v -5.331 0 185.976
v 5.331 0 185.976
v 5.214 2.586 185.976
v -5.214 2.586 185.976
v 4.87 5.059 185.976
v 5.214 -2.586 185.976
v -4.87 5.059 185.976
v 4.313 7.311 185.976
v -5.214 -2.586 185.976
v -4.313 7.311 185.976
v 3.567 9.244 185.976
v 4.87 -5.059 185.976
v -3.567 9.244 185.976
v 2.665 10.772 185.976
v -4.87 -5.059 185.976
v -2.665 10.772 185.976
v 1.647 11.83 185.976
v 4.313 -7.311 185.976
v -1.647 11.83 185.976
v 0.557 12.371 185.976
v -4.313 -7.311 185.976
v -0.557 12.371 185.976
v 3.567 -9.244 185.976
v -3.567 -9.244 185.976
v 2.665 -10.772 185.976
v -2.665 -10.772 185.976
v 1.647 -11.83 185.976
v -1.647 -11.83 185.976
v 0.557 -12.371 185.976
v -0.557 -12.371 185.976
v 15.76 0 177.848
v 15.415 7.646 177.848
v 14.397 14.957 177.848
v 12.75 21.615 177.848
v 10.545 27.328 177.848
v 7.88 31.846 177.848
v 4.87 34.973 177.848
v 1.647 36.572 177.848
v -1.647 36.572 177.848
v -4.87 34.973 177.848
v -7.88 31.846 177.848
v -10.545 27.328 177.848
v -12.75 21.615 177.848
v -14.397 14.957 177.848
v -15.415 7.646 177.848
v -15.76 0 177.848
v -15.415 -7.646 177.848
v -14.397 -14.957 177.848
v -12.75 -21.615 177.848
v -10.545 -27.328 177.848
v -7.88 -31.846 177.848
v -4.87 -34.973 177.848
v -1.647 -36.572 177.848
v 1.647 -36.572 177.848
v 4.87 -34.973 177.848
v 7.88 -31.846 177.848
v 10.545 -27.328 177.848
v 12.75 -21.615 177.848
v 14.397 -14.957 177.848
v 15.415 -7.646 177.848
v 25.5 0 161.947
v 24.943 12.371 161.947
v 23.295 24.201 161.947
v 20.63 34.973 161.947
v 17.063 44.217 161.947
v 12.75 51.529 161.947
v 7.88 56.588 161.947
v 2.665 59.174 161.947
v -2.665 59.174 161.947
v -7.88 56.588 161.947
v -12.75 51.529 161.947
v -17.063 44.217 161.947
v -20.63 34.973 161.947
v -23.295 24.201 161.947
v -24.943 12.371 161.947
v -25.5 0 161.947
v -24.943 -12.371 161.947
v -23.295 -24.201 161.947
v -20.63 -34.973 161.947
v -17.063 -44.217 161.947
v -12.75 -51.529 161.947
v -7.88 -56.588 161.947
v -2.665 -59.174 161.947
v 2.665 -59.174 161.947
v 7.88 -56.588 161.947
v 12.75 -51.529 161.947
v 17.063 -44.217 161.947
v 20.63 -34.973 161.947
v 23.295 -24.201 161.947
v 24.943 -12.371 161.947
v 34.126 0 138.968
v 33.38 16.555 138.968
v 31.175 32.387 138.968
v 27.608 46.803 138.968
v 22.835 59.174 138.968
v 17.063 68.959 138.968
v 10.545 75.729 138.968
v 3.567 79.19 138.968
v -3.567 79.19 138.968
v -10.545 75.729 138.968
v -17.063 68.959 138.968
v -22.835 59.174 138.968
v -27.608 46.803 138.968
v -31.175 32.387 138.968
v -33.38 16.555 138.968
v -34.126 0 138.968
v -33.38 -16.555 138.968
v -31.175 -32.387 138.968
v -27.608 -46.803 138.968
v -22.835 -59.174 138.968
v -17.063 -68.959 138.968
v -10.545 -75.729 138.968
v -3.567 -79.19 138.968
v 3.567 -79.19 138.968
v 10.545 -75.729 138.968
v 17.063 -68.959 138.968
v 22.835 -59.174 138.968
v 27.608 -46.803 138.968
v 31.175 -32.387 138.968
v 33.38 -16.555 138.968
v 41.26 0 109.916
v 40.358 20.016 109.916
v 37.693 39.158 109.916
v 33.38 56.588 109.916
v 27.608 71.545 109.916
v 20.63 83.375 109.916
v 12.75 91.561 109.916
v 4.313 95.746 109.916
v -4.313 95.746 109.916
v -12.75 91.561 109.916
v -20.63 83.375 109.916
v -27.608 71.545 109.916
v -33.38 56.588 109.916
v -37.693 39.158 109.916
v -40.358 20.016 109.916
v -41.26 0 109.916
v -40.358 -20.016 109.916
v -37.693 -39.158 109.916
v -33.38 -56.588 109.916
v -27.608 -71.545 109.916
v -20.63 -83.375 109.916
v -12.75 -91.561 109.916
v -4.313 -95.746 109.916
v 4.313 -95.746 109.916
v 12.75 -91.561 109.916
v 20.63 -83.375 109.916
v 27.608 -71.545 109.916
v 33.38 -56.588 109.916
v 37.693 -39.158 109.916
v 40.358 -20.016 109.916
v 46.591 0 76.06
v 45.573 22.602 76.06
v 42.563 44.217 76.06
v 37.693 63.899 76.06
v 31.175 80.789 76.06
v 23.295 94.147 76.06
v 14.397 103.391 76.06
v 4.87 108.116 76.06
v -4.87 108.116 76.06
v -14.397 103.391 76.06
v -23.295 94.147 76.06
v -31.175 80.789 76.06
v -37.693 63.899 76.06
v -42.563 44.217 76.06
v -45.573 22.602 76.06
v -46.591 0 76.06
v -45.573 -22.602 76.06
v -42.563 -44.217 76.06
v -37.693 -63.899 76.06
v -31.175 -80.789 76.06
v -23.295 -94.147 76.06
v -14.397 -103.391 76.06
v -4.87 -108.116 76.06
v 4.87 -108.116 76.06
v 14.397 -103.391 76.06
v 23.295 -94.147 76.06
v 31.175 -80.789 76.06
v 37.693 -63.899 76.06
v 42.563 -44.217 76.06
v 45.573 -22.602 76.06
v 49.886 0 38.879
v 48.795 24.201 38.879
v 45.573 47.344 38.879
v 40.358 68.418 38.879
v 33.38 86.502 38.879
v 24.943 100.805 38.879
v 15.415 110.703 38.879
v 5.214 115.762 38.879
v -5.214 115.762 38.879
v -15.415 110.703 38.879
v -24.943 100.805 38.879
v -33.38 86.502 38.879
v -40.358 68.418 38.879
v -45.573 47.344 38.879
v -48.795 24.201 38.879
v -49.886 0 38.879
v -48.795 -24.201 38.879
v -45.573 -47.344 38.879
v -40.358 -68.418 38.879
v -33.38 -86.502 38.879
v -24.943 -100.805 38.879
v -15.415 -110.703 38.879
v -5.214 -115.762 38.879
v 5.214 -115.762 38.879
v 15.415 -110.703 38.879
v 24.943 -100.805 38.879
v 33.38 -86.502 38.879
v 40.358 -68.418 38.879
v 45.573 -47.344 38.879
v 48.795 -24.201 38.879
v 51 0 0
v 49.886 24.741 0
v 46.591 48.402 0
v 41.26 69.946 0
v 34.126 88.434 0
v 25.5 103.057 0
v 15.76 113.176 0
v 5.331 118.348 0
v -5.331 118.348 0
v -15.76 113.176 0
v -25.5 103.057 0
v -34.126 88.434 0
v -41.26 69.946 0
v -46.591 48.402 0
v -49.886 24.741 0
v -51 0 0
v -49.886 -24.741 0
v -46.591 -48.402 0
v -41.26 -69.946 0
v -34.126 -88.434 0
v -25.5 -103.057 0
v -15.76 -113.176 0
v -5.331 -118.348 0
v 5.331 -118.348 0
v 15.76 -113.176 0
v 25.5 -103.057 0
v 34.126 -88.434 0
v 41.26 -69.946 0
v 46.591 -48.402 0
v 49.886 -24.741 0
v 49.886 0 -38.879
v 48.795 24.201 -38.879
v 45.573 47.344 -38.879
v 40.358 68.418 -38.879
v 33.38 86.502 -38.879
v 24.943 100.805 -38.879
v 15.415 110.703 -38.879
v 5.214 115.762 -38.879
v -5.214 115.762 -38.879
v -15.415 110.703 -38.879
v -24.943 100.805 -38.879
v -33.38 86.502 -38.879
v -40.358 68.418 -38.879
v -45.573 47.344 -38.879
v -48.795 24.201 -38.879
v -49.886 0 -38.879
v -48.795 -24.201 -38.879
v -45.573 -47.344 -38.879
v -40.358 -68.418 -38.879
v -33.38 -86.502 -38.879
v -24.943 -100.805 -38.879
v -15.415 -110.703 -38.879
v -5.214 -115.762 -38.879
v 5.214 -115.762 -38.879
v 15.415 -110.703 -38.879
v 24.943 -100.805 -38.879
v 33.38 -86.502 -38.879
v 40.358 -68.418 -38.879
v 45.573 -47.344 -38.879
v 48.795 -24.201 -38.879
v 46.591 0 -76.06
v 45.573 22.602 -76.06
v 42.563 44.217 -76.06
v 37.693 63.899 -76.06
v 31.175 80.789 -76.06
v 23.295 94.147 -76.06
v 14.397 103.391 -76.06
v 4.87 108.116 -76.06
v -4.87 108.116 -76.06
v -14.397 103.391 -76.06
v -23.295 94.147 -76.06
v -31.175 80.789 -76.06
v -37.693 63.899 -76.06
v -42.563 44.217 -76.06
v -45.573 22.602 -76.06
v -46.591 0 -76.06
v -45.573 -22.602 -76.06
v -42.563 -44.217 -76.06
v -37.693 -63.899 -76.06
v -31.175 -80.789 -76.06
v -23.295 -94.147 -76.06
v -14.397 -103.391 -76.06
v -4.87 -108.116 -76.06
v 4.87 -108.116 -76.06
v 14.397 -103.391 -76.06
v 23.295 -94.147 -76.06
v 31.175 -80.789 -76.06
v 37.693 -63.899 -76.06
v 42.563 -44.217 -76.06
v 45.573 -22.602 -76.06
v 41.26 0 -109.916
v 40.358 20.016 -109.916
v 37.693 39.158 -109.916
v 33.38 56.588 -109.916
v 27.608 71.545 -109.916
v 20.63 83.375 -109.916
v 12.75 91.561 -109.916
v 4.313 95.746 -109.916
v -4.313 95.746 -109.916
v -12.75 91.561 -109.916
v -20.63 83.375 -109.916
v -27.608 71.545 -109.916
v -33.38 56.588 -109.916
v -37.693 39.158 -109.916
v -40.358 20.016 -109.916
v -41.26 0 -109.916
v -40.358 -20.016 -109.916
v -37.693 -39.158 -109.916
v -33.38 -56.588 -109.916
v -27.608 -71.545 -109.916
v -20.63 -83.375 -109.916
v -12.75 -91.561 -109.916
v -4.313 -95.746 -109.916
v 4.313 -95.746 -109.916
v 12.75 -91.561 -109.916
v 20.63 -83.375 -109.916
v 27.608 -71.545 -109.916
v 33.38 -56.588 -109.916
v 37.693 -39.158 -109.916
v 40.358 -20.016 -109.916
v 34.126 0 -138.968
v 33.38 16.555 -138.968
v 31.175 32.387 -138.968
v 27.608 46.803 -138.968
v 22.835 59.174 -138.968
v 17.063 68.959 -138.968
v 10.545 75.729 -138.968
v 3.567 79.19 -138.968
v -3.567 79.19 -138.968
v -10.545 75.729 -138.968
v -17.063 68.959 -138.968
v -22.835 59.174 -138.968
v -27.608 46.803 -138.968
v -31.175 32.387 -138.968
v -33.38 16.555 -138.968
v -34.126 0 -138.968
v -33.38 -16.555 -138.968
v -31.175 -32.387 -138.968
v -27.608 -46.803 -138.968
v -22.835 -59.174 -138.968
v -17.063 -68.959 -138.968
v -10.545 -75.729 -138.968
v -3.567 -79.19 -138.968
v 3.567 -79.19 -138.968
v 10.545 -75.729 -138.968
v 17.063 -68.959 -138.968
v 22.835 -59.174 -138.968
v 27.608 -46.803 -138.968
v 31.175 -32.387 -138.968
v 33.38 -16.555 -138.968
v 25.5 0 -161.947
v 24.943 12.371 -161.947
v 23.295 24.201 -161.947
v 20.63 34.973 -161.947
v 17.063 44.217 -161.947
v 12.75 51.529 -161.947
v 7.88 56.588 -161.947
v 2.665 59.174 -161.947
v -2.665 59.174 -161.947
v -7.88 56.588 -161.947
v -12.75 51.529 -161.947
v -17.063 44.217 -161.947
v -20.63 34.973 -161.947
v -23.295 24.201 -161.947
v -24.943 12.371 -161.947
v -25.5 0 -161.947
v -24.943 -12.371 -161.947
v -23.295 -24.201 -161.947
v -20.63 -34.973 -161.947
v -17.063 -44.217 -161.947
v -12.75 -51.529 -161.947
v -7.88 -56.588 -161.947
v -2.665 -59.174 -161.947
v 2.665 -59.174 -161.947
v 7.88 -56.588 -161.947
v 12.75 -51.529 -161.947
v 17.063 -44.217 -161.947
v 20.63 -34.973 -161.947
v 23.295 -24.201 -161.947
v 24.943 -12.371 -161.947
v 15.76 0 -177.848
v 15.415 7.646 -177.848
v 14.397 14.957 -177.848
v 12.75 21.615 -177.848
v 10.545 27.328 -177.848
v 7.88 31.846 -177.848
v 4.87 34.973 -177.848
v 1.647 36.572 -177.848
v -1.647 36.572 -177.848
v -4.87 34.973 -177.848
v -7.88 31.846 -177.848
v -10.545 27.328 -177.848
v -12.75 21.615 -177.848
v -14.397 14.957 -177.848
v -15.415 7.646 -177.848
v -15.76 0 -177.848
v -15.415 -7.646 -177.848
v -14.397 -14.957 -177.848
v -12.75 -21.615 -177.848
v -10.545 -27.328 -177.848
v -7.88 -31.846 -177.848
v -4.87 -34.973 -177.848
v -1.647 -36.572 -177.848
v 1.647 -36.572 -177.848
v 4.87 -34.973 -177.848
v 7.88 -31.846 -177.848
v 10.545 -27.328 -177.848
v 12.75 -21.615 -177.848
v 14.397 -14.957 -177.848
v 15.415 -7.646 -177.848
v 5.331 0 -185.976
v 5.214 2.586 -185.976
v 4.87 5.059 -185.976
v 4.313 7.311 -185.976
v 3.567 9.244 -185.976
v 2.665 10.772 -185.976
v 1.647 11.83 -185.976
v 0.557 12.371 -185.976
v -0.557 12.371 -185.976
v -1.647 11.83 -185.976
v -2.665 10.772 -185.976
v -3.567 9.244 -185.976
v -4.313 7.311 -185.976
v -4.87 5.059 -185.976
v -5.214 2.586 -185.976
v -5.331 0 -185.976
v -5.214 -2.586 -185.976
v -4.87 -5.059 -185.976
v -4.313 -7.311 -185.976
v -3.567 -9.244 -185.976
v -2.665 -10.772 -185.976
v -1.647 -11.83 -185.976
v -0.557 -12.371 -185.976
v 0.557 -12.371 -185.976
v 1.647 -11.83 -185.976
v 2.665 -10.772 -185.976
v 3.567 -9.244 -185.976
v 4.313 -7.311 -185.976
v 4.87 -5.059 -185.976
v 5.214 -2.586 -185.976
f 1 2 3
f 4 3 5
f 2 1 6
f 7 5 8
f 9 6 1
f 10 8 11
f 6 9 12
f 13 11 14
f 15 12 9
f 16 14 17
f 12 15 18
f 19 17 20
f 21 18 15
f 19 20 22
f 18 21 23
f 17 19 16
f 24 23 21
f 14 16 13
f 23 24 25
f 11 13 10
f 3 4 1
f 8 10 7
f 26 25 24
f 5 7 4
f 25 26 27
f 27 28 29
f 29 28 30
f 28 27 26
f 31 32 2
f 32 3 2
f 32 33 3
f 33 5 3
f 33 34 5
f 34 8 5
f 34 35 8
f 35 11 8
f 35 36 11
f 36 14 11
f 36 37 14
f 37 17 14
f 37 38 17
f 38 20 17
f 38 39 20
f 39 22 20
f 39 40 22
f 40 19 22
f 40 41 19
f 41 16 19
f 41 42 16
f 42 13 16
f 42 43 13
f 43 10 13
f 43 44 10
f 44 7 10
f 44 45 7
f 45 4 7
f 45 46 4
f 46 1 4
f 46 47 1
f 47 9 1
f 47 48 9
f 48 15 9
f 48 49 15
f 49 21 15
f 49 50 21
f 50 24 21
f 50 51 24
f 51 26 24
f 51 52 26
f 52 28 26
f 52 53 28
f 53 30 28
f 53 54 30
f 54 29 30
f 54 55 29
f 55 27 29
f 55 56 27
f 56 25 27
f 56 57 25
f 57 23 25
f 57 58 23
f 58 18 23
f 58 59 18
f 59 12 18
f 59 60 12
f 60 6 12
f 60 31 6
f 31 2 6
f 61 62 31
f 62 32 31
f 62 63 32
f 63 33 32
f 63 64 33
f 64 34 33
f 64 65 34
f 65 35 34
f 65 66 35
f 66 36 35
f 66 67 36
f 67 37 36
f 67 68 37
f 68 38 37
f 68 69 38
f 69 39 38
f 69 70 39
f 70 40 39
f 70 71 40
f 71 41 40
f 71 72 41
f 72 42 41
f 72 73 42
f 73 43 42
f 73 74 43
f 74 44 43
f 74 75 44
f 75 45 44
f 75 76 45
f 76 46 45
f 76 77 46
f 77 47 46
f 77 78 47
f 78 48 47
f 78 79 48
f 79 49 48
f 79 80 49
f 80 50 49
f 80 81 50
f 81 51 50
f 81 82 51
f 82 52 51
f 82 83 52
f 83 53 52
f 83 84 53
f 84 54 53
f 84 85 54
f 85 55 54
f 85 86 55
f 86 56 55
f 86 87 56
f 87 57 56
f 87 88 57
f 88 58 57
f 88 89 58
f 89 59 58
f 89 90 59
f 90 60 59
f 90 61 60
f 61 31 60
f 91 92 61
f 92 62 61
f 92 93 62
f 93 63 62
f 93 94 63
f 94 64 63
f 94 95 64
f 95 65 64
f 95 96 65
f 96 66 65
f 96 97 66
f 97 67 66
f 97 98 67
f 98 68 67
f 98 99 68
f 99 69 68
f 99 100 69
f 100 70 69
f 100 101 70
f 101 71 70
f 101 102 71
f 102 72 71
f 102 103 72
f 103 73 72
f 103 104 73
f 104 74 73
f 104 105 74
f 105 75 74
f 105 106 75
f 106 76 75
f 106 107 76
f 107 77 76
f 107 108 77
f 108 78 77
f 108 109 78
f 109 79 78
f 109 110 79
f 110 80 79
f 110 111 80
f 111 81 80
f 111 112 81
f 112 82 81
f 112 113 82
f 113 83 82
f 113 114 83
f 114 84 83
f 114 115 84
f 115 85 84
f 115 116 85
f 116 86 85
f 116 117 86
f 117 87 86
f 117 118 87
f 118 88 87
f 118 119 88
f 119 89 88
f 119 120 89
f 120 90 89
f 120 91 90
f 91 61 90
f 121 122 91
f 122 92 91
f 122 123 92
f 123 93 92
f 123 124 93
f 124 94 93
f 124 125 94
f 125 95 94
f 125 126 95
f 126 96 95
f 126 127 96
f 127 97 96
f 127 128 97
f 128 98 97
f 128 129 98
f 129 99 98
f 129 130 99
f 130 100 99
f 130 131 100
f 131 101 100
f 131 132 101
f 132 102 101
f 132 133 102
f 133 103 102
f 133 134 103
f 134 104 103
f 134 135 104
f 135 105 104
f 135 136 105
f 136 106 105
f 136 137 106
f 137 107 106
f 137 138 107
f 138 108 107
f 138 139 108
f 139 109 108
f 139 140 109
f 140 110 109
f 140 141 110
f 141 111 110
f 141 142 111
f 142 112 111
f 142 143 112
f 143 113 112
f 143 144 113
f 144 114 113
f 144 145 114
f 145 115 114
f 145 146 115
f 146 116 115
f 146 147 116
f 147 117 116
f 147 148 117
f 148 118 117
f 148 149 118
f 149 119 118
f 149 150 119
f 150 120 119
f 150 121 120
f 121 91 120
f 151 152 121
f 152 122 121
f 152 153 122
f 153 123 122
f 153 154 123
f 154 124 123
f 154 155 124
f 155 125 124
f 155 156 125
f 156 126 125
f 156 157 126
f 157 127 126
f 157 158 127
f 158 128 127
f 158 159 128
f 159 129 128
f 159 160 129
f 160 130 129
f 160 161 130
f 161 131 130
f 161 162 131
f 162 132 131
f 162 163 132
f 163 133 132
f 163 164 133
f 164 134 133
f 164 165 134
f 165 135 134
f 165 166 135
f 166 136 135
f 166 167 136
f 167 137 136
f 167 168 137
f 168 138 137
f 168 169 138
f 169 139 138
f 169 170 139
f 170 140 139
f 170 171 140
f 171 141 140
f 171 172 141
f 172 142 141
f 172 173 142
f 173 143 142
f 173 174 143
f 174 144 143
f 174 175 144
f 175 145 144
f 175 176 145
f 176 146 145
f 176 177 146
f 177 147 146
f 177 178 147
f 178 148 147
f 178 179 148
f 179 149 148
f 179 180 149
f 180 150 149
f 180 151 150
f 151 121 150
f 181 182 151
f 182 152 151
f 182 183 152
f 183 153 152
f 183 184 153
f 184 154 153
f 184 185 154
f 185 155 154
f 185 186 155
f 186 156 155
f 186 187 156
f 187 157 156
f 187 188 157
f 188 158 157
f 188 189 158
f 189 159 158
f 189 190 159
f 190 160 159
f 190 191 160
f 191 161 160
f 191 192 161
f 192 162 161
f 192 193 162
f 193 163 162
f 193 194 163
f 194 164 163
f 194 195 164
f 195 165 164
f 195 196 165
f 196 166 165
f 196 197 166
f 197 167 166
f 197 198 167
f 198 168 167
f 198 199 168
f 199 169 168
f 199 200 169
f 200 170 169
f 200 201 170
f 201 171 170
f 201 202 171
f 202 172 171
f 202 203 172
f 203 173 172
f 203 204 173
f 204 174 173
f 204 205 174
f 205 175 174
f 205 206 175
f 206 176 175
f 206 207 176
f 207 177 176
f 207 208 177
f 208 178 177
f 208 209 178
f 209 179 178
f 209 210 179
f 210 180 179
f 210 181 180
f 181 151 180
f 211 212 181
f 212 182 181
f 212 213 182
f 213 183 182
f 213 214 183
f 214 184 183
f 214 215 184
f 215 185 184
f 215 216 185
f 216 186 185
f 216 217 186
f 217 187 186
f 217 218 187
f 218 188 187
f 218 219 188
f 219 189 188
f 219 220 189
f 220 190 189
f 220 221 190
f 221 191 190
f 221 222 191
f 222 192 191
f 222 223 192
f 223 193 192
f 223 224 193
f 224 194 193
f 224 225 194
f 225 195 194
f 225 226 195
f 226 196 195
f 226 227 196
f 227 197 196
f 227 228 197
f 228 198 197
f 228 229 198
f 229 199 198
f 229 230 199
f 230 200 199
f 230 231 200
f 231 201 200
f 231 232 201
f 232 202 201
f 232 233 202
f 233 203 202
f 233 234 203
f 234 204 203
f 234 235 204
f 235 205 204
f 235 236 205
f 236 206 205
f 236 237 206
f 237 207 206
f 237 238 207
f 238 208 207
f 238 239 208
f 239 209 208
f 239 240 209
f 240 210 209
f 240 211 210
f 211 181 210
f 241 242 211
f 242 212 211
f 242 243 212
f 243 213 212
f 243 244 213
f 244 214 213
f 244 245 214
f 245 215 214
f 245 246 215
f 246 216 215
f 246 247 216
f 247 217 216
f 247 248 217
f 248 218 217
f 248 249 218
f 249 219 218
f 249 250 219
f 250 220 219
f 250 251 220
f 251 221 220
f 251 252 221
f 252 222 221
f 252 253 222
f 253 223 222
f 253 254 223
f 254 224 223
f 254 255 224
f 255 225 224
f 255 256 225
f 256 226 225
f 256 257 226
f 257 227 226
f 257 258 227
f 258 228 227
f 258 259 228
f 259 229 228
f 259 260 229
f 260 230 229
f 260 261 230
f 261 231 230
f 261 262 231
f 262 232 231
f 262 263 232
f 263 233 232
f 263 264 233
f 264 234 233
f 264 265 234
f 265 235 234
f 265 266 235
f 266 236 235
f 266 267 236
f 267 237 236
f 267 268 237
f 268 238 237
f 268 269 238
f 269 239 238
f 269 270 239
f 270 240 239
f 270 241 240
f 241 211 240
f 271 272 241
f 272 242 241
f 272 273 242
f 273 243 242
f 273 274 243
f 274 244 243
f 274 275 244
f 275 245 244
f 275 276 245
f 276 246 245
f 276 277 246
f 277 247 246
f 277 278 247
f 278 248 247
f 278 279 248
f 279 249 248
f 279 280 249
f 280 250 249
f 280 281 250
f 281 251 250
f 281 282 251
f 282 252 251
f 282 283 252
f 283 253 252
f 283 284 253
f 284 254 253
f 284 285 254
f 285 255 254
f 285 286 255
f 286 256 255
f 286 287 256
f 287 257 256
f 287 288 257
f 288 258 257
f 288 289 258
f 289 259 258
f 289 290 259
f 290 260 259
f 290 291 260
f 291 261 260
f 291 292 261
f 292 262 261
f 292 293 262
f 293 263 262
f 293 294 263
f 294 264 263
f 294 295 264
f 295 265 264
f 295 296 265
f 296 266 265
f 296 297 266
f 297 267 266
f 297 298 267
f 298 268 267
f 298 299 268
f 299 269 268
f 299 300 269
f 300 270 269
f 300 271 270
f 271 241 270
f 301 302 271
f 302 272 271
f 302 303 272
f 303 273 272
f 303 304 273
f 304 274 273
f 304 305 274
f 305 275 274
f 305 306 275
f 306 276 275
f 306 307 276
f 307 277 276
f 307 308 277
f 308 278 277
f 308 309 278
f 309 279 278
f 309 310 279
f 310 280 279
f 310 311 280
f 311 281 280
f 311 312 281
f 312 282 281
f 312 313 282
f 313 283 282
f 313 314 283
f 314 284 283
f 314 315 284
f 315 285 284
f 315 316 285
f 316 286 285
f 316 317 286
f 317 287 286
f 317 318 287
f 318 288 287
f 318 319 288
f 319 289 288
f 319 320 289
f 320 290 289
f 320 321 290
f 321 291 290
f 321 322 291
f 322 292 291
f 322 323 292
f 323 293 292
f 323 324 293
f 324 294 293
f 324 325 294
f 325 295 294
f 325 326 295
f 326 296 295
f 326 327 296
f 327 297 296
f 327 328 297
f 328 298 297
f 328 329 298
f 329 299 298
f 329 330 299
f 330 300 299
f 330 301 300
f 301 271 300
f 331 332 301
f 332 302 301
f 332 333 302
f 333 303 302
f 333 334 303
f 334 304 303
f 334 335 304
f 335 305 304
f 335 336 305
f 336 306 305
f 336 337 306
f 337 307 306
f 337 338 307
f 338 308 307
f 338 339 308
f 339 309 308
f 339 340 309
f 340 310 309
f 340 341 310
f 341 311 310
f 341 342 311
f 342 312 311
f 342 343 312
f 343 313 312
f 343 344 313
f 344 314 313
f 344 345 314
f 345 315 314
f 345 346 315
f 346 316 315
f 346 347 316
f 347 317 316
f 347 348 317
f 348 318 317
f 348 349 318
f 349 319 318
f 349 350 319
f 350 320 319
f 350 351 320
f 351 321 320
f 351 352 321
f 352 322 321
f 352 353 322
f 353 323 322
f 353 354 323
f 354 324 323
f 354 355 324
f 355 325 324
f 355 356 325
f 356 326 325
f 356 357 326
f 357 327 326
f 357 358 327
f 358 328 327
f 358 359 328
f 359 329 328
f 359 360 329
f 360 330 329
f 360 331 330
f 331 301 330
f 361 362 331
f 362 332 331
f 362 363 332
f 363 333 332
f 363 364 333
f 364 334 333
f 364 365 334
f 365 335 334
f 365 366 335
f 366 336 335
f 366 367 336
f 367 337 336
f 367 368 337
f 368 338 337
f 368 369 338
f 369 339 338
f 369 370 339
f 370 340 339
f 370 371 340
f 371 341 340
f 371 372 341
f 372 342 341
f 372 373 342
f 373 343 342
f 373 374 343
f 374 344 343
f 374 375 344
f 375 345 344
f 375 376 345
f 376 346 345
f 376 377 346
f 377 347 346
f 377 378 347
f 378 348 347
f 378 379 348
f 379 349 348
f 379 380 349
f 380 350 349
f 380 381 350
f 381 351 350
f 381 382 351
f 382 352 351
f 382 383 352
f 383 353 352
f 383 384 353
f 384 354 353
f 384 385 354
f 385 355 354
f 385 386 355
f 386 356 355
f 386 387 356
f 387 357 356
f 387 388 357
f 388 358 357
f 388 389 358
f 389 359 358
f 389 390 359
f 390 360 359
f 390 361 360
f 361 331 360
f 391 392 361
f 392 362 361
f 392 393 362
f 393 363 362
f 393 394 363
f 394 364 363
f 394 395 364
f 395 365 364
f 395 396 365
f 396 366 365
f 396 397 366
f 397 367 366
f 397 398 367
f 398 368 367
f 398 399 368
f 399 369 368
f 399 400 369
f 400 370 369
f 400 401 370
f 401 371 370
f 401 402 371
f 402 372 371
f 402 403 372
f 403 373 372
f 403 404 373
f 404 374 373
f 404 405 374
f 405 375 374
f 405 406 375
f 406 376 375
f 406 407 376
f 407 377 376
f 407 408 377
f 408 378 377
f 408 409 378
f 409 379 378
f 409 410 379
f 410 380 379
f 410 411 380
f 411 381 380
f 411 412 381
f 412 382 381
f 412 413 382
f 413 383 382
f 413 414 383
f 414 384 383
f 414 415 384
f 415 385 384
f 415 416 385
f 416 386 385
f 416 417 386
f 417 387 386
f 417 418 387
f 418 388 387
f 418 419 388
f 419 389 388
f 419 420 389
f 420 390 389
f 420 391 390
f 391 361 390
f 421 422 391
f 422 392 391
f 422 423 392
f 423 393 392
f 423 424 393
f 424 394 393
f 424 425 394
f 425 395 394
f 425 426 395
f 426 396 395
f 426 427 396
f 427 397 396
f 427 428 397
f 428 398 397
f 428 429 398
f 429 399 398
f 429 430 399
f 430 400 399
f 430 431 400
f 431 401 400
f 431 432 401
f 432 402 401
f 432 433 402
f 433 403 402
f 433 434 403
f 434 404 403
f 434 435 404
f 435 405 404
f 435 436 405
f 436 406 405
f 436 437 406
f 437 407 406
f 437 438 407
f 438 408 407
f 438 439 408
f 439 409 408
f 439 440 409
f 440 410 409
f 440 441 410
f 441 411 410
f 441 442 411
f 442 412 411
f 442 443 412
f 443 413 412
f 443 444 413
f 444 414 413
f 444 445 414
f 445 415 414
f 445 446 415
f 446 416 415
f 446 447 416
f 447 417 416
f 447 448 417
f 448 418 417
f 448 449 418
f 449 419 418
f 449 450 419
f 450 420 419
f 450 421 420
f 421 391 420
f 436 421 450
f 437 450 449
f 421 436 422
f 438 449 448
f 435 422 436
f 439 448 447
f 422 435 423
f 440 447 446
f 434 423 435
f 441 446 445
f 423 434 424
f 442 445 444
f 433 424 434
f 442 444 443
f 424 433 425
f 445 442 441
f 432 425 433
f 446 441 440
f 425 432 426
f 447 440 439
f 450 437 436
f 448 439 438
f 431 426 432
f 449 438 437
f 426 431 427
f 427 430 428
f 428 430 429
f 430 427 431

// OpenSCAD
// Generated by SolidPython 1.0.1 on 2020-07-29 00:46:45


scale(v = [3, 7, 11]) {
	sphere(r = 17);
}
/***********************************************
*********      SolidPython code:      **********
************************************************
 
# import packages: SolidPython
from solid import *
from solid.utils import *
from itertools import chain, combinations, permutations


class Resize:

    def __init__(self, scad_file):
        self.scad_file = scad_file
        #self.scad_file = import_scad(scad_file)
        # cone/cylinder param:
        self.r1 = 0
        self.r2 = 0
        self.h = 0
        # rectangular prism param:
        self.w = 0
        self.l = 0
        # ellipse param:
        self.r = 0

    # import OpenScad code (file name corresponds to shape)


    # classify shape + parameters
    def assign(self, param1, param2, param3):
        if self.scad_file == 'cone.scad':
            self.r1 = param1
            self.r2 = param2
            self.h = param3
        elif self.scad_file == 'cylinder.scad':
            self.r1 = param1
            self.r2 = param2
            self.h = param3
        elif self.scad_file == 'rectangularPrism.scad':
            self.h = param1
            self.l = param2
            self.w = param3
        else:
            self.r = param1
            self.h = param2

    # resize parameters
    def iterate(self):
        x = range(3, 20, 2)
        i = 1
        if self.scad_file == 'cone.scad':
            tempList = list(permutations(x, 2))
            for temp in tempList:
                param1 = temp[0]
                param2 = temp[1]
                filepath = 'produced_scad_files/' + 'cone' + str(param1) + '_' + str(param2) + '_' + '.scad'
                scad_render_to_file(cylinder(h=param1, r1=param2, r2=0), filepath)

        elif self.scad_file == 'cylinder.scad':
            tempList = list(permutations(x, 3))
            for temp in tempList:
                param1 = temp[0]
                param2 = temp[1]
                filepath = 'produced_scad_files/' + 'cylinder' + str(param1) + '_' + str(param2) + '_' + '.scad'
                scad_render_to_file(cylinder(h=param1, r1=param2, r2=param2), filepath)

        elif self.scad_file == 'rectangularPrism.scad':
            tempList = list(permutations(x, 3))
            for temp in tempList:
                param1 = temp[0]
                param2 = temp[1]
                param3 = temp[2]
                filepath = 'produced_scad_files/' + 'rectangularPrism' + str(param1) + '_' + str(param2) + '_' + str(
                    param3) + '.scad'
                scad_render_to_file(cube(size=(param1, param2, param3)), filepath)

        elif self.scad_file == 'ellipse.scad':
            tempList = list(permutations(x, 4))
            for temp in tempList:
                param1 = temp[0]
                param2 = temp[1]
                param3 = temp[2]
                param4 = temp[3]
                filepath = 'produced_scad_files/' + 'ellipse' + str(param1) + '_' + str(param2) + '_' + str(param3) + '_' + str(param4) + '.scad'
                scad_render_to_file(scale([param1, param2, param3])(sphere(r=param4)), filepath)

    def render_to_scadfile(self):
        scad_render_to_file(scad, 'example.scad') 
 
************************************************/
